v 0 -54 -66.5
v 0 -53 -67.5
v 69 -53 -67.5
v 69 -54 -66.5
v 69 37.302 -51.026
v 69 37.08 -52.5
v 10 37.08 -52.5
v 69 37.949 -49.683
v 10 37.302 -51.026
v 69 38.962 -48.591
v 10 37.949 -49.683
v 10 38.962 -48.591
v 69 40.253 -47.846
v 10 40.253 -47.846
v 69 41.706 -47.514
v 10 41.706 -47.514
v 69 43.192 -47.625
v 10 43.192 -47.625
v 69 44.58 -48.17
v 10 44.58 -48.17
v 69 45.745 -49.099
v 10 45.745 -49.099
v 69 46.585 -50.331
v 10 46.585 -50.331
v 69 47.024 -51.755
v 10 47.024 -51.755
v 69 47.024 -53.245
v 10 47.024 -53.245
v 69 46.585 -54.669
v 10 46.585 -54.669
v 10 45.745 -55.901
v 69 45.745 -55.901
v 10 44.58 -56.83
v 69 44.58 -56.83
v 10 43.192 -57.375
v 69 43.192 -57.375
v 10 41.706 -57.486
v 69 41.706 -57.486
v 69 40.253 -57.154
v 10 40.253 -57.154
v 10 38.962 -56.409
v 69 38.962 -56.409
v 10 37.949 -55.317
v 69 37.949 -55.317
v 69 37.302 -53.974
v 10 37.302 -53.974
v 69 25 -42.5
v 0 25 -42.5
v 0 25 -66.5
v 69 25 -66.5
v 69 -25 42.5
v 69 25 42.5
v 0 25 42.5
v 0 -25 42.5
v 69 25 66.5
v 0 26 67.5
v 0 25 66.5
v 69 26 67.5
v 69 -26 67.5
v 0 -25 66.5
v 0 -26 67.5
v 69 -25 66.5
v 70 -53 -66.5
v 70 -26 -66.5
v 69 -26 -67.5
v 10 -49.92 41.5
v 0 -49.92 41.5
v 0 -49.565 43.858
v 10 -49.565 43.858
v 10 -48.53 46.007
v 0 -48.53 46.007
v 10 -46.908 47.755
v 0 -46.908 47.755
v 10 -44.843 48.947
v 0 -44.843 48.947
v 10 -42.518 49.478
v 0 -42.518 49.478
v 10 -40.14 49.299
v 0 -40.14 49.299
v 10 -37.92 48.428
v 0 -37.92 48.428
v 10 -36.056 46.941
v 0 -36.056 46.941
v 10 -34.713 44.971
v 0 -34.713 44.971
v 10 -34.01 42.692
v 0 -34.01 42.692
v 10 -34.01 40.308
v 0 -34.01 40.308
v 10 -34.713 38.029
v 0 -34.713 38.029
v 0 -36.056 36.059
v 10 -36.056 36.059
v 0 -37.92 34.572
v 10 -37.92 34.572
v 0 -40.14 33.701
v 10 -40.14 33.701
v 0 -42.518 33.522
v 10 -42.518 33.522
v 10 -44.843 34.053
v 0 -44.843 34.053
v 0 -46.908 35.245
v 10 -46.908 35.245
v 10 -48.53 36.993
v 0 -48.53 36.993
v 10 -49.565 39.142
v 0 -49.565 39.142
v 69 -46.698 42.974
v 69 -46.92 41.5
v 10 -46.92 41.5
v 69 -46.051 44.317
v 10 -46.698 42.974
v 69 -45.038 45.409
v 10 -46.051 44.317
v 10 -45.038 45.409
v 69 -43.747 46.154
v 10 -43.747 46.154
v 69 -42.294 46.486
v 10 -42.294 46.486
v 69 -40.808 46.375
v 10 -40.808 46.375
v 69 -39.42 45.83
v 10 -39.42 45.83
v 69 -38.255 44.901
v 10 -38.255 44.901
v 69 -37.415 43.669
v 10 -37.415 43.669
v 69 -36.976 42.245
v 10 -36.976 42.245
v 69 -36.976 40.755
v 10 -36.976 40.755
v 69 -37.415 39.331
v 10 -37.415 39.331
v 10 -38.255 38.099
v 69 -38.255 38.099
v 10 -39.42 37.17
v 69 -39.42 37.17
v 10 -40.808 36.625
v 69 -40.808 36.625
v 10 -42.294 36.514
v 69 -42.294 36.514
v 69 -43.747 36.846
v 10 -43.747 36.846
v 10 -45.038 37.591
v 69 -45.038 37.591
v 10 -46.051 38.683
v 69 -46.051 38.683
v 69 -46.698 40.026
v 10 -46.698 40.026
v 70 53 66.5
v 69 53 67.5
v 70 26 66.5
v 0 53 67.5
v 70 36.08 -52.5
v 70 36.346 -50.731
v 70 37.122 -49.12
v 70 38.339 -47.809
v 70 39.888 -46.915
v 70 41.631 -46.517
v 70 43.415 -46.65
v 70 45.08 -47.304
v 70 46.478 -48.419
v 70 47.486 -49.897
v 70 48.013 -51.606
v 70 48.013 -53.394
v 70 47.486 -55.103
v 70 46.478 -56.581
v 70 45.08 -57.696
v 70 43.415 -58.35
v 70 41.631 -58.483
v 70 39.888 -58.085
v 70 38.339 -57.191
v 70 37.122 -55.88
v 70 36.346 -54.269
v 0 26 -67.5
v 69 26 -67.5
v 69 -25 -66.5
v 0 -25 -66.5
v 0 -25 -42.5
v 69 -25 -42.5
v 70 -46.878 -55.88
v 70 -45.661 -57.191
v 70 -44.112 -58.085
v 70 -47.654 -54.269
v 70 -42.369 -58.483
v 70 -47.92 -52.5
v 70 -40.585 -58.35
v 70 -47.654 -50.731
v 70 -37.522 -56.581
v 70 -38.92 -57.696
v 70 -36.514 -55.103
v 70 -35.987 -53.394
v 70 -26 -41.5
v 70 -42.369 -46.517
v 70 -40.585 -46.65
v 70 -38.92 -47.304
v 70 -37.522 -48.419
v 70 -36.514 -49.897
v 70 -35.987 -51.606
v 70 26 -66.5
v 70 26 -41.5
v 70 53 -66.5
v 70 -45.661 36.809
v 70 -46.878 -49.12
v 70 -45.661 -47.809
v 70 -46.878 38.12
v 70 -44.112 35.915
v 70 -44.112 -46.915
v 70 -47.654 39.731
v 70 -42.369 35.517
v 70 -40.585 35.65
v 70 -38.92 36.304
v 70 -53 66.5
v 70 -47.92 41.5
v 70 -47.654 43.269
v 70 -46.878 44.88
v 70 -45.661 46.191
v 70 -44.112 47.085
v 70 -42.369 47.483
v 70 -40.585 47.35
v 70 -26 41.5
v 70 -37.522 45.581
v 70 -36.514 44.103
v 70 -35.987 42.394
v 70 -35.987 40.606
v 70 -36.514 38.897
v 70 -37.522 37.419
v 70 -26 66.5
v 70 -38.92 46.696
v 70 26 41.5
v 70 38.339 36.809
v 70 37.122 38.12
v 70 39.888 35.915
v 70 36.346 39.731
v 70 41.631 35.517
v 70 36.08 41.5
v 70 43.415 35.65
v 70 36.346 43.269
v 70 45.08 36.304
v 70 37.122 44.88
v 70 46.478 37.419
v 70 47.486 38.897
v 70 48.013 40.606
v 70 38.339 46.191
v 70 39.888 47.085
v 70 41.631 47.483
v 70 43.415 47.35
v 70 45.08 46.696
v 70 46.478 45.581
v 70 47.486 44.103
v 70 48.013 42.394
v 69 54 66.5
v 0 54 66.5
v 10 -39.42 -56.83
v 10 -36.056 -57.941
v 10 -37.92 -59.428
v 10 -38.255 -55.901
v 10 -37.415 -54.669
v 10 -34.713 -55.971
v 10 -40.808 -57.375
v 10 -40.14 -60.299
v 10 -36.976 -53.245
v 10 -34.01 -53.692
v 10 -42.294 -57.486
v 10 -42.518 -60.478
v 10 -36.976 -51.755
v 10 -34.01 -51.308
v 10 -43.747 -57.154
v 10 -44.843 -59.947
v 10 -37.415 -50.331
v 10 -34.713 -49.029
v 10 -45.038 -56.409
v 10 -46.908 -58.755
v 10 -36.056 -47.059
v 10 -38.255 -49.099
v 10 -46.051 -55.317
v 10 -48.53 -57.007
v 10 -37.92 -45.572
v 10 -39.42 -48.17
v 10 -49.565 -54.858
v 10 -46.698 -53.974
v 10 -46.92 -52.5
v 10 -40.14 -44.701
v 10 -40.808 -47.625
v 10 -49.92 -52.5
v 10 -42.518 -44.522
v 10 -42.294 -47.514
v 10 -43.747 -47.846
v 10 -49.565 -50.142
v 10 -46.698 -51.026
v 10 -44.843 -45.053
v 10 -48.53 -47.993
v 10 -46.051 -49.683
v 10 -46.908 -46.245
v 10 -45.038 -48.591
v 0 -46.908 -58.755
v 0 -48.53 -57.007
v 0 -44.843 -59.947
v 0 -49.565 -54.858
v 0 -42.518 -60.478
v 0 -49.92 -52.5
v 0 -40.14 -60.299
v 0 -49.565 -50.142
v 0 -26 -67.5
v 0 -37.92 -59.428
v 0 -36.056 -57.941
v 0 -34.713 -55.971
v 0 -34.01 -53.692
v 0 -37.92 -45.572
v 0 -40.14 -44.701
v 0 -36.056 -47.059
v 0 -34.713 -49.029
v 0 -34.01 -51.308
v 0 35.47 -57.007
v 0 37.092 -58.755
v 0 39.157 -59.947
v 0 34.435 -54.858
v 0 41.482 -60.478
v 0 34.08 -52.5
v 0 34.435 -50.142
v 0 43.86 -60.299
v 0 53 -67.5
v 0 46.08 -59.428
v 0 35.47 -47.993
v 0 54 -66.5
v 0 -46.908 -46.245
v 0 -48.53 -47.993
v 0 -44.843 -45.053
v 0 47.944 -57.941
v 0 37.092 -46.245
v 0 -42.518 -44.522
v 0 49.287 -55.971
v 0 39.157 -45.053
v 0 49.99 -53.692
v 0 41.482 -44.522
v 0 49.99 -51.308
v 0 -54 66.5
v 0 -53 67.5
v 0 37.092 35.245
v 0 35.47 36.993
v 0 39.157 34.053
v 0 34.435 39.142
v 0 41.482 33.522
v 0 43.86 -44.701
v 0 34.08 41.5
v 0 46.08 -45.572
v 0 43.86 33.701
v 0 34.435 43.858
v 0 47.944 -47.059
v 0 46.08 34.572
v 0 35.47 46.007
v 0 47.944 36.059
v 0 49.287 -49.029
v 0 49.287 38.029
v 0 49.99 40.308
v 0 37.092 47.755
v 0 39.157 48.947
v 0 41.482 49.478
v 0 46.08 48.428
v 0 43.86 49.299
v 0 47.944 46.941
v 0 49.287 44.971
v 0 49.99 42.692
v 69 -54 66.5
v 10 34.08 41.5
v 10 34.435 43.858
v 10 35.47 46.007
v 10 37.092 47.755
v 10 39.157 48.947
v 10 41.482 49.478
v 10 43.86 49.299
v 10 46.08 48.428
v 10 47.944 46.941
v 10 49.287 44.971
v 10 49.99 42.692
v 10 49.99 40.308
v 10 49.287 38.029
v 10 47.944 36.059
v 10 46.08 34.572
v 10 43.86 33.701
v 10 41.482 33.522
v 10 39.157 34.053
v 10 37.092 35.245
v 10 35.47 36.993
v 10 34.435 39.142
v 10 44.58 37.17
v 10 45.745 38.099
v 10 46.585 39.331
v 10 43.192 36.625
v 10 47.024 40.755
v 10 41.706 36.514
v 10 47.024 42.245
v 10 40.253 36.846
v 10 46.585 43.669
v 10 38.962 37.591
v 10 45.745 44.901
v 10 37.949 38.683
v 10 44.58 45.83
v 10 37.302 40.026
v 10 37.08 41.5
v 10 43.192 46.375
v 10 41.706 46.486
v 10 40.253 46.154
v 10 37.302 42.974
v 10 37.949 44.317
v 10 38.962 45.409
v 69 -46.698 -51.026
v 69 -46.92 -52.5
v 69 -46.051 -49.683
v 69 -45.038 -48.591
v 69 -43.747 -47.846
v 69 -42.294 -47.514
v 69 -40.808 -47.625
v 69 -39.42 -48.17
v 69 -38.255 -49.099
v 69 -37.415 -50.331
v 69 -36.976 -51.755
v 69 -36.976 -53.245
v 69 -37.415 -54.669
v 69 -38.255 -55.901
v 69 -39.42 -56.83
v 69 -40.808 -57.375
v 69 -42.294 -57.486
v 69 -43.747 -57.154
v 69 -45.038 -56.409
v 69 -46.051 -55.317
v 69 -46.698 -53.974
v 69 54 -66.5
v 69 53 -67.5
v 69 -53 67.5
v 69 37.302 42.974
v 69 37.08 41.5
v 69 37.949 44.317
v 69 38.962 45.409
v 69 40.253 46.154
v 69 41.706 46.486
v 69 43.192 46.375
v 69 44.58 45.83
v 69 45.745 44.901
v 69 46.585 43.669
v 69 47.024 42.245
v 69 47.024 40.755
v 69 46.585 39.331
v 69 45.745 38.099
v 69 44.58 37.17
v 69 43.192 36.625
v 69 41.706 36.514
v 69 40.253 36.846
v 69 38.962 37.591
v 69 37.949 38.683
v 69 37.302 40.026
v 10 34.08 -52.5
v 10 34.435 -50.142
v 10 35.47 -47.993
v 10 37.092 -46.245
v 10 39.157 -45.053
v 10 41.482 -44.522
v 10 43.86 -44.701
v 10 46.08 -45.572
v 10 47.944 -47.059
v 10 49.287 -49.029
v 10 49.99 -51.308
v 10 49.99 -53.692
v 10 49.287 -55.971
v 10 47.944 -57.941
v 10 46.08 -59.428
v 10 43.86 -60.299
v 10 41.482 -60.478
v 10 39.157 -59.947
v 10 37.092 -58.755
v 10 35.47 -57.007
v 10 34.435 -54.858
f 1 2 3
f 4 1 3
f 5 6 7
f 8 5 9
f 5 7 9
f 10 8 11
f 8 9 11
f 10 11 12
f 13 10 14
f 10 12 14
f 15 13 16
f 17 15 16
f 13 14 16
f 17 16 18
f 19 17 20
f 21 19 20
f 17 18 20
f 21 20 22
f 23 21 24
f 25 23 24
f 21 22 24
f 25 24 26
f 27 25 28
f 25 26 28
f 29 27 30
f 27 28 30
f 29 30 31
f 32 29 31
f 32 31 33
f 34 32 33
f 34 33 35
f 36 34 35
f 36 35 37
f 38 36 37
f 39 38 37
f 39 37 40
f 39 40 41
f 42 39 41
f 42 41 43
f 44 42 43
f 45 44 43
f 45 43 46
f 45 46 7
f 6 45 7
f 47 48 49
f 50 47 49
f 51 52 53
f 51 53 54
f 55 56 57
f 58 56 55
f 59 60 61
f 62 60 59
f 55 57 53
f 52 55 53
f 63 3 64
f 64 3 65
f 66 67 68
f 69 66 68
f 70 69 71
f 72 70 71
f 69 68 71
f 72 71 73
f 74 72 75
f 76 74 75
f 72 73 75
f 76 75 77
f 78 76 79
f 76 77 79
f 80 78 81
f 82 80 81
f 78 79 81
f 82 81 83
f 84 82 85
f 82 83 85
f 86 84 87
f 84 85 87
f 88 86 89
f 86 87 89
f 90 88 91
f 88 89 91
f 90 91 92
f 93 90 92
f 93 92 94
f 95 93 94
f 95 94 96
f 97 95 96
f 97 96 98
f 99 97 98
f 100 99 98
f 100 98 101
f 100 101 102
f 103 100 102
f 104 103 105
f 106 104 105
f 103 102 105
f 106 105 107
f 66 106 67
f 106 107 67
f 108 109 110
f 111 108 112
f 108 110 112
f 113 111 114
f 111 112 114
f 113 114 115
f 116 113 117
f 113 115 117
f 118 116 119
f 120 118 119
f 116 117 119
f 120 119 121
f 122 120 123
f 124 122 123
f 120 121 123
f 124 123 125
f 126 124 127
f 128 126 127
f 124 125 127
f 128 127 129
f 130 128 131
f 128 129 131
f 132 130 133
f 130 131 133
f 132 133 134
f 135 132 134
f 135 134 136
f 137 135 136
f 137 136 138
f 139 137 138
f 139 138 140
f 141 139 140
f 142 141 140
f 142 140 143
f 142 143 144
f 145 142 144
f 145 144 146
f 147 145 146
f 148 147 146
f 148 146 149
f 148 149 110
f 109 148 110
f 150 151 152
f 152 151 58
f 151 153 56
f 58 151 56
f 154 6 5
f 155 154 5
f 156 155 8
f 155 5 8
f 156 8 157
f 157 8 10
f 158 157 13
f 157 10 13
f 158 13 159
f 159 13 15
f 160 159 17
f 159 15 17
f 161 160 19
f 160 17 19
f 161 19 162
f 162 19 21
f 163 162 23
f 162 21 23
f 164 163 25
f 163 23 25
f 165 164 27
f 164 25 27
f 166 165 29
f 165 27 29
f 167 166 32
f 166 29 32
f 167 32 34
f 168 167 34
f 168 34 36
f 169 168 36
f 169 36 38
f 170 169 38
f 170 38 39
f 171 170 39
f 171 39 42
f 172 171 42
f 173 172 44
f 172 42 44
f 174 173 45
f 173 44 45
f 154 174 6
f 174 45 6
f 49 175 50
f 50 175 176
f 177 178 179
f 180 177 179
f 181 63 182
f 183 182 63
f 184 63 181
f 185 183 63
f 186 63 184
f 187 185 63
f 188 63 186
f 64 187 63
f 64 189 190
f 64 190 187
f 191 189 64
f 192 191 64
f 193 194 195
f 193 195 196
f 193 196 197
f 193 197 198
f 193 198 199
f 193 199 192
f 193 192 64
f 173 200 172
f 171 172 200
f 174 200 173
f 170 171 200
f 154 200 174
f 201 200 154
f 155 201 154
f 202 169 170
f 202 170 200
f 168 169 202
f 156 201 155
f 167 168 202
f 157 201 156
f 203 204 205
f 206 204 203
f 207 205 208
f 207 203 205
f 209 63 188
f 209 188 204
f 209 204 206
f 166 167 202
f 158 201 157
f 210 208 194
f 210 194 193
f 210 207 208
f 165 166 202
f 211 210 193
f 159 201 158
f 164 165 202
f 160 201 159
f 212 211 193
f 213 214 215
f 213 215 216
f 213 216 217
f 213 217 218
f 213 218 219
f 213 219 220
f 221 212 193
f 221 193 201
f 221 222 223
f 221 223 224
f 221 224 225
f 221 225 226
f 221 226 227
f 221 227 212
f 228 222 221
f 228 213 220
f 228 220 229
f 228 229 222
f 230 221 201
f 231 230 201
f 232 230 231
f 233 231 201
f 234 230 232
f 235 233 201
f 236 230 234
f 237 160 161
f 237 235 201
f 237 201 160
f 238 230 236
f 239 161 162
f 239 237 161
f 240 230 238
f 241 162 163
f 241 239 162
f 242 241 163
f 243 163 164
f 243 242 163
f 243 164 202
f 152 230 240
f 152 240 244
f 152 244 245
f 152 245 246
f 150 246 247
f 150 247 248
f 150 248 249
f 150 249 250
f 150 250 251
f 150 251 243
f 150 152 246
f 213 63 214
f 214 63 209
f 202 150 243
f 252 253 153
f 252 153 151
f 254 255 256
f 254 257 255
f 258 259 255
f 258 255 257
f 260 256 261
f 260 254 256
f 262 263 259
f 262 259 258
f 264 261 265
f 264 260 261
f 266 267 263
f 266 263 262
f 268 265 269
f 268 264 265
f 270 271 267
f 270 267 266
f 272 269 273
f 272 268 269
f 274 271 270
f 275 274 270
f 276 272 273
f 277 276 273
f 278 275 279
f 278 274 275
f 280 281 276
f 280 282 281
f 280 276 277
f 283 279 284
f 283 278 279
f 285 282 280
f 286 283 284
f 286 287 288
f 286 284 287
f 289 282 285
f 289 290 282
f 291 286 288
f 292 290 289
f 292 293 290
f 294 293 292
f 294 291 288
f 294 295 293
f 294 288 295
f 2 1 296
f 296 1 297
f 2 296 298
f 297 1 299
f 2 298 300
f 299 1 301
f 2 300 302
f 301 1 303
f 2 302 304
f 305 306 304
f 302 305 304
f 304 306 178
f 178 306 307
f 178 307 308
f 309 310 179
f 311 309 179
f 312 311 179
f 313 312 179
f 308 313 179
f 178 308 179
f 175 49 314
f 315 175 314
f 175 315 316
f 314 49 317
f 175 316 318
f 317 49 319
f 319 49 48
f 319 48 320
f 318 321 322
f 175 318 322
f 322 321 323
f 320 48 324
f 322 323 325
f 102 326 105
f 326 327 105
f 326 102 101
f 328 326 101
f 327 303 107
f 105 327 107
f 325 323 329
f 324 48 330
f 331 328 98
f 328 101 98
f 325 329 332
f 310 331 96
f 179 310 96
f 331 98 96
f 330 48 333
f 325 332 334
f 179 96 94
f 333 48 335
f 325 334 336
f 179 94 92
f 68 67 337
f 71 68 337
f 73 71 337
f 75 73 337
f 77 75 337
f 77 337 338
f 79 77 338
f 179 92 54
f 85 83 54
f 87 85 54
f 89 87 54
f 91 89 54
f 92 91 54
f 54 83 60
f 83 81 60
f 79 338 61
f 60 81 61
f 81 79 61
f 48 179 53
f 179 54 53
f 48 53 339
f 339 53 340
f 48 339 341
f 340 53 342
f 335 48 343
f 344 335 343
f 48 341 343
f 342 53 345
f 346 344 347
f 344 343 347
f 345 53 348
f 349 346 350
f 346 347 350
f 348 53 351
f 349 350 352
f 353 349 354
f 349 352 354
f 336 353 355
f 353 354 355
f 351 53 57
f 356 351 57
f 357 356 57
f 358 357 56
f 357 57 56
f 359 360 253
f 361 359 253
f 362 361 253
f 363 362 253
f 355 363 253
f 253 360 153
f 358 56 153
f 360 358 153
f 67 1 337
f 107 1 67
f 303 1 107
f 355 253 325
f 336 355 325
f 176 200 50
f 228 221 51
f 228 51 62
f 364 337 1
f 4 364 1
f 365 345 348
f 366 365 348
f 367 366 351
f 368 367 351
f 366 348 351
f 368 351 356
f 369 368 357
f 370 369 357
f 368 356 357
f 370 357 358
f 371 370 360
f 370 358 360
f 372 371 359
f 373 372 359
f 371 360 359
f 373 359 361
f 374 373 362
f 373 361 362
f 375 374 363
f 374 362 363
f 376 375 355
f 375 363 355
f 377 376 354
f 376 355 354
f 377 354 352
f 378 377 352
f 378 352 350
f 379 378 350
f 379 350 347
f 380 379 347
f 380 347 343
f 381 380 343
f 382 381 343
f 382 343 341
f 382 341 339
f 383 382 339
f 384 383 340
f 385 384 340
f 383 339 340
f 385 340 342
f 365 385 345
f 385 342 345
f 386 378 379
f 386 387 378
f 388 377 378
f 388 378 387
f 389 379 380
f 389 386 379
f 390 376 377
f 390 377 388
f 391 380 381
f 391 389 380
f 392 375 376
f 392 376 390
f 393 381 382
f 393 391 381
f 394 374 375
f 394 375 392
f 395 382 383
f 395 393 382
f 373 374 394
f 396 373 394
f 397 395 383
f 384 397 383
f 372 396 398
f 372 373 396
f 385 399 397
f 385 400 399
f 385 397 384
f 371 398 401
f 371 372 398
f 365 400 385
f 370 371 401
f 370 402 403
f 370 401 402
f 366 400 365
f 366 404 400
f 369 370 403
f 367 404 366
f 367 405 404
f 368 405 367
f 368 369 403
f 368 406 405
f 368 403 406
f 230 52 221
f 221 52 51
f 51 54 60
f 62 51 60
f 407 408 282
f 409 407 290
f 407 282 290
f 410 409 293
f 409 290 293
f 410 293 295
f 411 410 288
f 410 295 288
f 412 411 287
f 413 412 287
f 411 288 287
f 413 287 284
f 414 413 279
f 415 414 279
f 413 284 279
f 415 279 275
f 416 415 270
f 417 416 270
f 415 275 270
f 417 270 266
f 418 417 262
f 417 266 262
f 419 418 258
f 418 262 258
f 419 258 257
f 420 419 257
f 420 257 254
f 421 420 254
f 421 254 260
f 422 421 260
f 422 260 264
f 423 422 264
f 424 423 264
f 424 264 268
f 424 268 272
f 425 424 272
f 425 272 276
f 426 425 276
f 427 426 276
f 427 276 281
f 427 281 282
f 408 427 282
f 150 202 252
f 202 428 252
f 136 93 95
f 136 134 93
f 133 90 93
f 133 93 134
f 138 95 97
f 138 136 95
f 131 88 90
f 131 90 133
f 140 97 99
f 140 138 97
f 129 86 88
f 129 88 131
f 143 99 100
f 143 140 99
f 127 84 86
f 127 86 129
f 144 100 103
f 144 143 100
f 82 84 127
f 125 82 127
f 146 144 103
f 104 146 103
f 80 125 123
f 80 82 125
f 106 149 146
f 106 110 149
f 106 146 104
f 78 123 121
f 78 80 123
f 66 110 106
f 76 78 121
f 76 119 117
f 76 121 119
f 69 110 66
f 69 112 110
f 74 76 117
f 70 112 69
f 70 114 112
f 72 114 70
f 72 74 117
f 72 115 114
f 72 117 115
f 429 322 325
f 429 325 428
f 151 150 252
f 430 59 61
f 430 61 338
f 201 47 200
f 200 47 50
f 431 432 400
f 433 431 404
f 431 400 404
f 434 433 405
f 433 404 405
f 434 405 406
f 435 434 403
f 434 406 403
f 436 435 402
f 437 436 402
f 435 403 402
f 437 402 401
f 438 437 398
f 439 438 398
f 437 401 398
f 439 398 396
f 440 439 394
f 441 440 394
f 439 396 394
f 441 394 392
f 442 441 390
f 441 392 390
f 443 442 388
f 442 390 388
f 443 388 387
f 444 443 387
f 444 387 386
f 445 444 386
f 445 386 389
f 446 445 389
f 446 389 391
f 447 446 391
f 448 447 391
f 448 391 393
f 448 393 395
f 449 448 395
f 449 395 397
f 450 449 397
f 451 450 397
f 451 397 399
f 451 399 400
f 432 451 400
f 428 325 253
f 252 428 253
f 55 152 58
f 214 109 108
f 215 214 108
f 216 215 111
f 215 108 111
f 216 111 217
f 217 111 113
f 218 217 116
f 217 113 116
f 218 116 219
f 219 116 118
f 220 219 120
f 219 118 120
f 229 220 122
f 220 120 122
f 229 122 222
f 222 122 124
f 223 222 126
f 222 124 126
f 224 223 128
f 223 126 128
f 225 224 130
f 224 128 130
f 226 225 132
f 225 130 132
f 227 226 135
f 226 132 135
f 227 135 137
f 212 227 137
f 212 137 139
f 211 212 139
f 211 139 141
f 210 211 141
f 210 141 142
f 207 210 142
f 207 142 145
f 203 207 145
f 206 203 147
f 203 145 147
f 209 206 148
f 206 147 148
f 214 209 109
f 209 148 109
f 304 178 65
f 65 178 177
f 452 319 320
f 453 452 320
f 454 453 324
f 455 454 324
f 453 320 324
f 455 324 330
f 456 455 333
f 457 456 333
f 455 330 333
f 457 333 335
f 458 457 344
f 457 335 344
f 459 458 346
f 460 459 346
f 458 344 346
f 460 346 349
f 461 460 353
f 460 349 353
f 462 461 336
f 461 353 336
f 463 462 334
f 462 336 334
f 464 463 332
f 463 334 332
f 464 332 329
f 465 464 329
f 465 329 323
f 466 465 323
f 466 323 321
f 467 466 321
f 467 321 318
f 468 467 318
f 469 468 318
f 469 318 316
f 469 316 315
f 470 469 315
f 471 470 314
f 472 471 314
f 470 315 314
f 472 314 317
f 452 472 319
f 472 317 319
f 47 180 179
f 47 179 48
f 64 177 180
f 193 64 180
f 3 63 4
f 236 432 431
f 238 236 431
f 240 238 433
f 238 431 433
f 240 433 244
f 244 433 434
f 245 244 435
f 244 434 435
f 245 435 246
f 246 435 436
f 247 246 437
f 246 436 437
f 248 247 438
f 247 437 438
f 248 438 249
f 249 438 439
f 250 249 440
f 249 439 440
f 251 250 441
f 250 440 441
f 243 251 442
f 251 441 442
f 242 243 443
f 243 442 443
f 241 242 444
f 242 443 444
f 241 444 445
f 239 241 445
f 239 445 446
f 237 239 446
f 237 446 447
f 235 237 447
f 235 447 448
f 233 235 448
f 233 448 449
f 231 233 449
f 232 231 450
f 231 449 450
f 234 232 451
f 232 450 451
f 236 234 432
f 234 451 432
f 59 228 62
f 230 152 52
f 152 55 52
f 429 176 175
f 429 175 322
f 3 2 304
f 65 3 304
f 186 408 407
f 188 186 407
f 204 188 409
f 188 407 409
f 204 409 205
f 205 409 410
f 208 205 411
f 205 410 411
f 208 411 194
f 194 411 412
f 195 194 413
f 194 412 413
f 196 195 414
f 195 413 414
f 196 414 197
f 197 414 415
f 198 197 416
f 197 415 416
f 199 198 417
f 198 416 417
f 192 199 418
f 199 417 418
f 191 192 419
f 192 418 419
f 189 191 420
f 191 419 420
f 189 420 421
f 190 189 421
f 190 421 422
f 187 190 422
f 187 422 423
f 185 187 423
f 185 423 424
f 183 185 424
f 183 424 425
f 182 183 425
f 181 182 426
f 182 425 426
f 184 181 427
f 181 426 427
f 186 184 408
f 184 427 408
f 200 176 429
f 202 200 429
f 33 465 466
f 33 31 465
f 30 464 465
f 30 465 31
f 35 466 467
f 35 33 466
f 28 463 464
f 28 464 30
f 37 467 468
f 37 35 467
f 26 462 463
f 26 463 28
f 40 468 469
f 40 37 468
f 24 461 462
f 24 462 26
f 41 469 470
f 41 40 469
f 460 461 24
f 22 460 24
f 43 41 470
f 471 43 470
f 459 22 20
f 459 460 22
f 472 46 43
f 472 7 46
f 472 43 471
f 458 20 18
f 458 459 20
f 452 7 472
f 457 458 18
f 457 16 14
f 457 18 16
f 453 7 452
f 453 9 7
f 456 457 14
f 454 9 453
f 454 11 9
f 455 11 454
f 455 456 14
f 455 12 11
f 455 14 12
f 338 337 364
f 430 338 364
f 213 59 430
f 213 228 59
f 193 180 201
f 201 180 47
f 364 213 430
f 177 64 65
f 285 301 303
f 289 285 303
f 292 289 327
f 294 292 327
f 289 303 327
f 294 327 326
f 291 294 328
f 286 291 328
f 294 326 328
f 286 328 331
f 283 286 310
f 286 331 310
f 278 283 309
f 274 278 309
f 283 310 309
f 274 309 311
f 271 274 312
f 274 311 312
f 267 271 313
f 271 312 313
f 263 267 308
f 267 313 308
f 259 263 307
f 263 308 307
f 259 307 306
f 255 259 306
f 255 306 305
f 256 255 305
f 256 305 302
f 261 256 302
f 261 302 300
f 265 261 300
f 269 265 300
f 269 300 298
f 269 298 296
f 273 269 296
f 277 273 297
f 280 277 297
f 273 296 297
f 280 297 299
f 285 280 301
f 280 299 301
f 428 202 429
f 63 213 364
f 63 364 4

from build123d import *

# Parameters (mm, degrees)
F1_DEPTH = 70
F2_R     = 8
F3_DEPTH = 10
F4_R     = 5
F5_DEPTH = 70.001
F6_SIZE  = 1


# Not quite as in the source:
# - a feature names something its author has since deleted; it is built from what else it names


with BuildPart() as f1:
    # F0 (on Right) → F1 (new body)
    with BuildSketch(Plane.YZ):
        Polygon((-25, 67.5), (-54, 67.5), (-54, -67.5), (-25, -67.5), (-25, -42.5), (25, -42.5), (25, -67.5), (54, -67.5), (54, 67.5), (25, 67.5), (25, 42.5), (-25, 42.5), align=None)
    extrude(amount=F1_DEPTH)

    # F2 (on face) → F3 (cut)
    with BuildSketch(Plane(origin=(0, 0, 0), x_dir=(0, -1, 0), z_dir=(-1, 0, 0))):
        with Locations((41.9203005731, 41.5)):
            Circle(F2_R)
        with Locations((-42.0796994269, 41.5)):
            Circle(F2_R)
        with Locations((41.9203005731, -52.5)):
            Circle(F2_R)
        with Locations((-42.0796994269, -52.5)):
            Circle(F2_R)
    extrude(amount=-F3_DEPTH, mode=Mode.SUBTRACT)

    # F4 (on face) → F5 (cut, through all)
    with BuildSketch(Plane(origin=(0, 0, 0), x_dir=(0, -1, 0), z_dir=(-1, 0, 0))):
        with Locations((-42.0796994269, 41.5)):
            Circle(F4_R)
        with Locations((41.9203005731, 41.5)):
            Circle(F4_R)
        with Locations((41.9203005731, -52.5)):
            Circle(F4_R)
        with Locations((-42.0796994269, -52.5)):
            Circle(F4_R)
    extrude(amount=-F5_DEPTH, mode=Mode.SUBTRACT)

    # F6
    f6_edges = [f1.edges().sort_by_distance(p)[0] for p in [
        (70, -39.5, 67.5),
        (70, -25, 55),
        (70, -54, 0),
        (70, 0, 42.5),
        (70, -39.5, -67.5),
        (70, 25, 55),
        (70, -25, -55),
        (70, 39.5, 67.5),
        (70, 0, -42.5),
        (70, 54, 0),
        (70, 25, -55),
        (70, 39.5, -67.5),
        (70, -36.920301, -52.5),
        (70, 47.079699, -52.5),
        (70, -36.920301, 41.5),
        (70, 47.079699, 41.5),
        (35, -54, -67.5),
        (35, -25, -67.5),
        (35, 25, -67.5),
        (35, 54, -67.5),
        (35, -54, 67.5),
        (35, -25, 67.5),
        (35, 25, 67.5),
        (35, 54, 67.5),
    ]]
    chamfer(f6_edges, length=F6_SIZE)


solid = f1.part
